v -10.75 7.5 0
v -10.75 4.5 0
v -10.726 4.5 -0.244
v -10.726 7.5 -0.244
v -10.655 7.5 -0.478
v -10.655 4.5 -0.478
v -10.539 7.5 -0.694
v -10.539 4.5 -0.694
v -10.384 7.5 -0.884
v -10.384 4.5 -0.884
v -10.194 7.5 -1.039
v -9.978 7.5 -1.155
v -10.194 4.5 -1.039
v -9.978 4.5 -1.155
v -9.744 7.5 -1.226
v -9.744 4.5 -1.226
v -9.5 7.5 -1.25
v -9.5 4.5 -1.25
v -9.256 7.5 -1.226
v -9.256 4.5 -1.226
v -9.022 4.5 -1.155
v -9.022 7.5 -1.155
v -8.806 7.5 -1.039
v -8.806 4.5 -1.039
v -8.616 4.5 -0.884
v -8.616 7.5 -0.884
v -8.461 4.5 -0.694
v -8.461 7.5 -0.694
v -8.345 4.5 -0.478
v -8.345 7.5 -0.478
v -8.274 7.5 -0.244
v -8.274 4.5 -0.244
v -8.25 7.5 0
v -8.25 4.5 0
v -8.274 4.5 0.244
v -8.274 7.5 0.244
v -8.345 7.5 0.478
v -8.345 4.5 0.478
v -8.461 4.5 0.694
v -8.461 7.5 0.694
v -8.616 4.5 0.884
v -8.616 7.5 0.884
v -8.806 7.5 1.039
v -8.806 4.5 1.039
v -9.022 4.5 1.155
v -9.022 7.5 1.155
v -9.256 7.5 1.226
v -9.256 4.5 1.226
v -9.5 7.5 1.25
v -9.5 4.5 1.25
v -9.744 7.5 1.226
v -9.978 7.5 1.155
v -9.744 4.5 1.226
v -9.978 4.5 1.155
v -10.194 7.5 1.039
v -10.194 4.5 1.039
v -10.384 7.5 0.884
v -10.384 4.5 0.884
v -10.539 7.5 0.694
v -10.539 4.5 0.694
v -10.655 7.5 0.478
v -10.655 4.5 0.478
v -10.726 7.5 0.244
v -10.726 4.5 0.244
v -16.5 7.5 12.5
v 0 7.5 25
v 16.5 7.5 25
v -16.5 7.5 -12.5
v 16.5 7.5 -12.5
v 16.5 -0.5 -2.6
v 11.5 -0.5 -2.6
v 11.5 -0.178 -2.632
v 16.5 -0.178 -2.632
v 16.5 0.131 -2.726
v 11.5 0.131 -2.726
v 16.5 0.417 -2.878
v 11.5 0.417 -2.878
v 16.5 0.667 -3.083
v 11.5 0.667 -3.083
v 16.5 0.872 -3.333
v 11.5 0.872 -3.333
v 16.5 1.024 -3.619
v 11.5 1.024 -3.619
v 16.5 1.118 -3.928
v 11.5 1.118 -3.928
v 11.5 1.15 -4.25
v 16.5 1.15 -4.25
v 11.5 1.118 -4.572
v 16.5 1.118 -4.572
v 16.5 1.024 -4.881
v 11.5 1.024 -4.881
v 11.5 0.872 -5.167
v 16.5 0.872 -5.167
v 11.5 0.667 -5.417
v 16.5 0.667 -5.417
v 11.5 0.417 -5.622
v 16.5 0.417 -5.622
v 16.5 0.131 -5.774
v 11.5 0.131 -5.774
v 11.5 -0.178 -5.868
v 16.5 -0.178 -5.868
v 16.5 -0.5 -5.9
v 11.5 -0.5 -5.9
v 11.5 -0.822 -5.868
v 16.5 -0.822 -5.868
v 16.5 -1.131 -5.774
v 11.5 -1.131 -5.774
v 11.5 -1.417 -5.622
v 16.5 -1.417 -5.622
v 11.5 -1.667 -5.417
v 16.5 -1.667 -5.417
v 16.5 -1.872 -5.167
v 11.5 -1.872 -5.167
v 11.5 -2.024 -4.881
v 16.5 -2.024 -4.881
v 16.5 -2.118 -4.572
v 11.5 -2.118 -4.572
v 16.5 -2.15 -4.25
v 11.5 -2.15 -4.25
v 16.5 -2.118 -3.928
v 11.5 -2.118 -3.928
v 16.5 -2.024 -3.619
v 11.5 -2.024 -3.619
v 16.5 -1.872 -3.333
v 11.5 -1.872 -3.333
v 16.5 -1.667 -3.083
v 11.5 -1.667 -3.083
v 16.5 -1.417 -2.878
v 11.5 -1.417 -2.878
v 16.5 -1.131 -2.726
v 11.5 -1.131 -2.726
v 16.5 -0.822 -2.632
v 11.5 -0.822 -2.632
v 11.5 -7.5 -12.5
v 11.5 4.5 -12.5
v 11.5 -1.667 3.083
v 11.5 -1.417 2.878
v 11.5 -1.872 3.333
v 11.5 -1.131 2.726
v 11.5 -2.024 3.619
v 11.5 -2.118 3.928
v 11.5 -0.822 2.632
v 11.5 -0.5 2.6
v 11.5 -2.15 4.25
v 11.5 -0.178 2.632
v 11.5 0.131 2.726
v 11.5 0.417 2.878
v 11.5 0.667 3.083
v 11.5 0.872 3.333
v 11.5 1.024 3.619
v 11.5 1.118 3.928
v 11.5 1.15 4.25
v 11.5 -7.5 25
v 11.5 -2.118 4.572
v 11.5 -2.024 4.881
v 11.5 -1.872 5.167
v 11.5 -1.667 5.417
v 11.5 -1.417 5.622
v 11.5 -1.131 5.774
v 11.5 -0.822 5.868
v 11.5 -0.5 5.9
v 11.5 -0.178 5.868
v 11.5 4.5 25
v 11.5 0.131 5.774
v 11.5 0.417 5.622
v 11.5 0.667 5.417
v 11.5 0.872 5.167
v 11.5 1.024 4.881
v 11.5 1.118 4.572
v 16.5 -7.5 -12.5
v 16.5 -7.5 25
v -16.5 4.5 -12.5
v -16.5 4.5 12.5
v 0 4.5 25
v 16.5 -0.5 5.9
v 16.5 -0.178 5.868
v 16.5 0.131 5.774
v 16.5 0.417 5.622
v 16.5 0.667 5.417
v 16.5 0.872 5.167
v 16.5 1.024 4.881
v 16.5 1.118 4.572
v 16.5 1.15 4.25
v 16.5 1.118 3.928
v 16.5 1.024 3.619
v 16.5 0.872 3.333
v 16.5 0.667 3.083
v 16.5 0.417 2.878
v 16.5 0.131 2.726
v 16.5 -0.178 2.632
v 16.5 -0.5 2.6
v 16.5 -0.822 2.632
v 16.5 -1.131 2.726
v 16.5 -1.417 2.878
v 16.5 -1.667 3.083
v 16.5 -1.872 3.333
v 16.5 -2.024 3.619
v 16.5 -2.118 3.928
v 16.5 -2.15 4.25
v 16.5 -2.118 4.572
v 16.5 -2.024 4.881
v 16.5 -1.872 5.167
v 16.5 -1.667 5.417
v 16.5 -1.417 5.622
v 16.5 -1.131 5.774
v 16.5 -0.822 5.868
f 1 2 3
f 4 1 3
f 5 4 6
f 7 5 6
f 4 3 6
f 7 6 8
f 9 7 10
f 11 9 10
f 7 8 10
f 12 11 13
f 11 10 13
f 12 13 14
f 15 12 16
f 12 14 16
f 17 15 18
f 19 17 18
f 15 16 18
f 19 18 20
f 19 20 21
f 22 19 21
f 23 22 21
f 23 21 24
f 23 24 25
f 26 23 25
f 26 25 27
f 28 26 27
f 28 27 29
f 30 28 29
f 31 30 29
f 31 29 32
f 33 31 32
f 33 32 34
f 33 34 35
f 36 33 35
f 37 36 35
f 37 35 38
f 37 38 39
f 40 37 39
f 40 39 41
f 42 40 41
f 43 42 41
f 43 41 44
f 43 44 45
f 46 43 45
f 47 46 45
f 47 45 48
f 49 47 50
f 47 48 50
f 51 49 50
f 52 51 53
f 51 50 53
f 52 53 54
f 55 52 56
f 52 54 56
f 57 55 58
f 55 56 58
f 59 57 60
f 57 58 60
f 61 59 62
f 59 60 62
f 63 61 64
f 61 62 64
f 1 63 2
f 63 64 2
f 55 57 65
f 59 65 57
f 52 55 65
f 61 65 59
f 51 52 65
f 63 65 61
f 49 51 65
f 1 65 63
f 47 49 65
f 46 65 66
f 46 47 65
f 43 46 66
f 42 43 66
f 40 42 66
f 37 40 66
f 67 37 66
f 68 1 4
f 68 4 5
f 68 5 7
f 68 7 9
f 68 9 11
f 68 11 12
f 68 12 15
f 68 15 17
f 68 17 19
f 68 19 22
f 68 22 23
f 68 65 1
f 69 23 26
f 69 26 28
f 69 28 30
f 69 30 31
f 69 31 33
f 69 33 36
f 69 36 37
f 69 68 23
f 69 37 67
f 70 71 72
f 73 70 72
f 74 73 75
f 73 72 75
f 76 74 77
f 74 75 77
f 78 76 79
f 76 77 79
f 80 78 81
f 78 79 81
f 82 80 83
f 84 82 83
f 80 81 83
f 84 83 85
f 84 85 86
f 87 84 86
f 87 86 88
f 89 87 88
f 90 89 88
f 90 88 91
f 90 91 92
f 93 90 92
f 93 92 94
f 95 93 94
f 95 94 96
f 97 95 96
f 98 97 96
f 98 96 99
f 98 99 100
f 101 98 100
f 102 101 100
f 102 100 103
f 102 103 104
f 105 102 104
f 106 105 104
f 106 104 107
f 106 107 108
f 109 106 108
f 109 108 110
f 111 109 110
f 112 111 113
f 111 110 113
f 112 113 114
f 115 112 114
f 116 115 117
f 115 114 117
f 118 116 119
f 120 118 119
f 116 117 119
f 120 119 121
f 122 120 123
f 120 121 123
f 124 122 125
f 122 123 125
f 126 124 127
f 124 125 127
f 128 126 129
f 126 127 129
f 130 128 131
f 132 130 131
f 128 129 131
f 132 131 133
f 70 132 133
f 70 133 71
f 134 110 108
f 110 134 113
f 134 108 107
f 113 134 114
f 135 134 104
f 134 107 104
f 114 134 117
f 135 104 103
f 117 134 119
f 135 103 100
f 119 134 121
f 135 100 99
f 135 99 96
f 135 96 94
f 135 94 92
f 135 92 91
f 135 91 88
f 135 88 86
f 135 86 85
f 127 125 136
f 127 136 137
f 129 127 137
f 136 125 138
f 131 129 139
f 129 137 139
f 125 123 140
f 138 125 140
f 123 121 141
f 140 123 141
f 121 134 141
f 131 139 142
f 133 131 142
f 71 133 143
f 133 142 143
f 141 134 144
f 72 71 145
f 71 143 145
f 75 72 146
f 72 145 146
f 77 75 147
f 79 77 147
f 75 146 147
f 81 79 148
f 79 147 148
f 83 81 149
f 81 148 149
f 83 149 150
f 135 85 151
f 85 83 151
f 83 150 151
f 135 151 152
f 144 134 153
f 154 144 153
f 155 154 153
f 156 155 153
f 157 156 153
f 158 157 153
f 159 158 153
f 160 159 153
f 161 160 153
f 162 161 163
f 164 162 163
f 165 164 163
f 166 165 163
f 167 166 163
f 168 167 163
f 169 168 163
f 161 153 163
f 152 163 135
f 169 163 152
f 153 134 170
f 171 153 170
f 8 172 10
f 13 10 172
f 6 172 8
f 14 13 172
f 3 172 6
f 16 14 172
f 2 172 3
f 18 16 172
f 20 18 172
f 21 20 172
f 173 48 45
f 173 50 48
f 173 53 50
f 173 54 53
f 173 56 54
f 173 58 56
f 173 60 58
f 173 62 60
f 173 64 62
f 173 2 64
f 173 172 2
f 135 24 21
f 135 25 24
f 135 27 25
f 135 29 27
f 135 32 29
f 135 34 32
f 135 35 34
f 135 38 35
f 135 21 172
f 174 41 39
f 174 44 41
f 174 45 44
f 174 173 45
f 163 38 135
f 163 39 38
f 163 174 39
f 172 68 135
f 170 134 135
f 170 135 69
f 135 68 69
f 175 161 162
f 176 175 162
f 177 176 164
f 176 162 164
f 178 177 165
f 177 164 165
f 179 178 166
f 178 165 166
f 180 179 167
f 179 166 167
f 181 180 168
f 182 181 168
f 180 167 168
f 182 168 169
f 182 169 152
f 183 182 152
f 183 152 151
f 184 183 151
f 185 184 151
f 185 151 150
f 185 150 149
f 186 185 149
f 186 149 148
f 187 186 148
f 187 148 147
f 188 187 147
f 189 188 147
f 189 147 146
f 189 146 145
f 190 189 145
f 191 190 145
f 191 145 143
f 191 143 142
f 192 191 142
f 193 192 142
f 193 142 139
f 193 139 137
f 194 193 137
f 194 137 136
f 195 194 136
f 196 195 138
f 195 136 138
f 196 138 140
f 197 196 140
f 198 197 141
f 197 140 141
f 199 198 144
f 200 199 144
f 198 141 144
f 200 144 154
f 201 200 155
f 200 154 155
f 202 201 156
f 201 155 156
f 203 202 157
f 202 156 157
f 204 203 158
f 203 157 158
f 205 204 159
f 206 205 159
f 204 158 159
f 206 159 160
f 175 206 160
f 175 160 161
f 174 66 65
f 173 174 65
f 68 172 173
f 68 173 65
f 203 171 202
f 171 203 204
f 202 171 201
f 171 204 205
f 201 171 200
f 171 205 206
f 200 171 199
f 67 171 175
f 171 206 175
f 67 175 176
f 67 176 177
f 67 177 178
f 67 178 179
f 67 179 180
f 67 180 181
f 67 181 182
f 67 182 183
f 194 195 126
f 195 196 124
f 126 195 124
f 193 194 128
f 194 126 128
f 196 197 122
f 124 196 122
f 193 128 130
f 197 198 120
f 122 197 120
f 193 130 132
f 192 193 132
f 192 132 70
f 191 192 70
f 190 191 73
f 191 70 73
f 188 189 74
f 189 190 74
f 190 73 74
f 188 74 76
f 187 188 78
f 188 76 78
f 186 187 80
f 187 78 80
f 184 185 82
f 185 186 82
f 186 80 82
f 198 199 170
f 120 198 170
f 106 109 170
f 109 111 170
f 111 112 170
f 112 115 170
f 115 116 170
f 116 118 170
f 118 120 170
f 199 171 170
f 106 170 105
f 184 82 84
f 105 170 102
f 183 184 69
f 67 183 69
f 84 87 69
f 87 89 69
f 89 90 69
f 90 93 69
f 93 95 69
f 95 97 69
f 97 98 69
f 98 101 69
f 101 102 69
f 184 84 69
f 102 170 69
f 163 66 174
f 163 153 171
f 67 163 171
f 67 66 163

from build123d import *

# Parameters (mm, degrees)
AUFSATZ_LINEAR_AUSTRAGEN1_DEPTH      = 25
AUFSATZ_LINEAR_AUSTRAGEN1_DEPTH_BACK = 12.5
SKIZZE1_W                            = 33
SKIZZE1_H                            = 15
SKIZZE2_W                            = 28
SKIZZE2_H                            = 12
SCHNITT_LINEAR_AUSTRAGEN1_DEPTH      = 42.650330131
M3_GEWINDEBOHRUNG1_D                 = 2.5
M4_GEWINDEBOHRUNG1_D                 = 3.3
SCHNITT_LINEAR_AUSTRAGEN2_DEPTH      = 34.5


with BuildPart() as part:
    # Skizze1 → Aufsatz-Linear austragen1 (new, two sides: drawn at the far end of the back side and taken through both)
    with BuildSketch(Plane.XY.offset(-AUFSATZ_LINEAR_AUSTRAGEN1_DEPTH_BACK)):
        Rectangle(SKIZZE1_W, SKIZZE1_H)
    extrude(amount=AUFSATZ_LINEAR_AUSTRAGEN1_DEPTH + AUFSATZ_LINEAR_AUSTRAGEN1_DEPTH_BACK)

    # Skizze2 → Schnitt-Linear austragen1 (cut, through all)
    with BuildSketch(Plane.XY.offset(25)):
        with Locations((-2.5, -1.5)):
            Rectangle(SKIZZE2_W, SKIZZE2_H)
    extrude(amount=-SCHNITT_LINEAR_AUSTRAGEN1_DEPTH, mode=Mode.SUBTRACT)

    # M3 Gewindebohrung1 (through all)
    with Locations(Plane(origin=(0, 7.5, 0), x_dir=(1, 0, 0), z_dir=(0, 1, 0))):
        with Locations((-9.5, 0)):
            Hole(M3_GEWINDEBOHRUNG1_D / 2)

    # M4 Gewindebohrung1 (through all)
    with Locations(Plane(origin=(16.5, 0, 0), x_dir=(0, 0, -1), z_dir=(1, 0, 0))):
        with Locations((-4.25, -0.5), (4.25, -0.5)):
            Hole(M4_GEWINDEBOHRUNG1_D / 2)

    # Skizze7 → Schnitt-Linear austragen2 (cut, through all)
    with BuildSketch(Plane(origin=(0, 7.5, 0), x_dir=(1, 0, 0), z_dir=(0, 1, 0))):
        Polygon((0, -25), (-16.5, -12.5), (-16.5, -25), align=None)
    extrude(amount=-SCHNITT_LINEAR_AUSTRAGEN2_DEPTH, mode=Mode.SUBTRACT)


solid = part.part
